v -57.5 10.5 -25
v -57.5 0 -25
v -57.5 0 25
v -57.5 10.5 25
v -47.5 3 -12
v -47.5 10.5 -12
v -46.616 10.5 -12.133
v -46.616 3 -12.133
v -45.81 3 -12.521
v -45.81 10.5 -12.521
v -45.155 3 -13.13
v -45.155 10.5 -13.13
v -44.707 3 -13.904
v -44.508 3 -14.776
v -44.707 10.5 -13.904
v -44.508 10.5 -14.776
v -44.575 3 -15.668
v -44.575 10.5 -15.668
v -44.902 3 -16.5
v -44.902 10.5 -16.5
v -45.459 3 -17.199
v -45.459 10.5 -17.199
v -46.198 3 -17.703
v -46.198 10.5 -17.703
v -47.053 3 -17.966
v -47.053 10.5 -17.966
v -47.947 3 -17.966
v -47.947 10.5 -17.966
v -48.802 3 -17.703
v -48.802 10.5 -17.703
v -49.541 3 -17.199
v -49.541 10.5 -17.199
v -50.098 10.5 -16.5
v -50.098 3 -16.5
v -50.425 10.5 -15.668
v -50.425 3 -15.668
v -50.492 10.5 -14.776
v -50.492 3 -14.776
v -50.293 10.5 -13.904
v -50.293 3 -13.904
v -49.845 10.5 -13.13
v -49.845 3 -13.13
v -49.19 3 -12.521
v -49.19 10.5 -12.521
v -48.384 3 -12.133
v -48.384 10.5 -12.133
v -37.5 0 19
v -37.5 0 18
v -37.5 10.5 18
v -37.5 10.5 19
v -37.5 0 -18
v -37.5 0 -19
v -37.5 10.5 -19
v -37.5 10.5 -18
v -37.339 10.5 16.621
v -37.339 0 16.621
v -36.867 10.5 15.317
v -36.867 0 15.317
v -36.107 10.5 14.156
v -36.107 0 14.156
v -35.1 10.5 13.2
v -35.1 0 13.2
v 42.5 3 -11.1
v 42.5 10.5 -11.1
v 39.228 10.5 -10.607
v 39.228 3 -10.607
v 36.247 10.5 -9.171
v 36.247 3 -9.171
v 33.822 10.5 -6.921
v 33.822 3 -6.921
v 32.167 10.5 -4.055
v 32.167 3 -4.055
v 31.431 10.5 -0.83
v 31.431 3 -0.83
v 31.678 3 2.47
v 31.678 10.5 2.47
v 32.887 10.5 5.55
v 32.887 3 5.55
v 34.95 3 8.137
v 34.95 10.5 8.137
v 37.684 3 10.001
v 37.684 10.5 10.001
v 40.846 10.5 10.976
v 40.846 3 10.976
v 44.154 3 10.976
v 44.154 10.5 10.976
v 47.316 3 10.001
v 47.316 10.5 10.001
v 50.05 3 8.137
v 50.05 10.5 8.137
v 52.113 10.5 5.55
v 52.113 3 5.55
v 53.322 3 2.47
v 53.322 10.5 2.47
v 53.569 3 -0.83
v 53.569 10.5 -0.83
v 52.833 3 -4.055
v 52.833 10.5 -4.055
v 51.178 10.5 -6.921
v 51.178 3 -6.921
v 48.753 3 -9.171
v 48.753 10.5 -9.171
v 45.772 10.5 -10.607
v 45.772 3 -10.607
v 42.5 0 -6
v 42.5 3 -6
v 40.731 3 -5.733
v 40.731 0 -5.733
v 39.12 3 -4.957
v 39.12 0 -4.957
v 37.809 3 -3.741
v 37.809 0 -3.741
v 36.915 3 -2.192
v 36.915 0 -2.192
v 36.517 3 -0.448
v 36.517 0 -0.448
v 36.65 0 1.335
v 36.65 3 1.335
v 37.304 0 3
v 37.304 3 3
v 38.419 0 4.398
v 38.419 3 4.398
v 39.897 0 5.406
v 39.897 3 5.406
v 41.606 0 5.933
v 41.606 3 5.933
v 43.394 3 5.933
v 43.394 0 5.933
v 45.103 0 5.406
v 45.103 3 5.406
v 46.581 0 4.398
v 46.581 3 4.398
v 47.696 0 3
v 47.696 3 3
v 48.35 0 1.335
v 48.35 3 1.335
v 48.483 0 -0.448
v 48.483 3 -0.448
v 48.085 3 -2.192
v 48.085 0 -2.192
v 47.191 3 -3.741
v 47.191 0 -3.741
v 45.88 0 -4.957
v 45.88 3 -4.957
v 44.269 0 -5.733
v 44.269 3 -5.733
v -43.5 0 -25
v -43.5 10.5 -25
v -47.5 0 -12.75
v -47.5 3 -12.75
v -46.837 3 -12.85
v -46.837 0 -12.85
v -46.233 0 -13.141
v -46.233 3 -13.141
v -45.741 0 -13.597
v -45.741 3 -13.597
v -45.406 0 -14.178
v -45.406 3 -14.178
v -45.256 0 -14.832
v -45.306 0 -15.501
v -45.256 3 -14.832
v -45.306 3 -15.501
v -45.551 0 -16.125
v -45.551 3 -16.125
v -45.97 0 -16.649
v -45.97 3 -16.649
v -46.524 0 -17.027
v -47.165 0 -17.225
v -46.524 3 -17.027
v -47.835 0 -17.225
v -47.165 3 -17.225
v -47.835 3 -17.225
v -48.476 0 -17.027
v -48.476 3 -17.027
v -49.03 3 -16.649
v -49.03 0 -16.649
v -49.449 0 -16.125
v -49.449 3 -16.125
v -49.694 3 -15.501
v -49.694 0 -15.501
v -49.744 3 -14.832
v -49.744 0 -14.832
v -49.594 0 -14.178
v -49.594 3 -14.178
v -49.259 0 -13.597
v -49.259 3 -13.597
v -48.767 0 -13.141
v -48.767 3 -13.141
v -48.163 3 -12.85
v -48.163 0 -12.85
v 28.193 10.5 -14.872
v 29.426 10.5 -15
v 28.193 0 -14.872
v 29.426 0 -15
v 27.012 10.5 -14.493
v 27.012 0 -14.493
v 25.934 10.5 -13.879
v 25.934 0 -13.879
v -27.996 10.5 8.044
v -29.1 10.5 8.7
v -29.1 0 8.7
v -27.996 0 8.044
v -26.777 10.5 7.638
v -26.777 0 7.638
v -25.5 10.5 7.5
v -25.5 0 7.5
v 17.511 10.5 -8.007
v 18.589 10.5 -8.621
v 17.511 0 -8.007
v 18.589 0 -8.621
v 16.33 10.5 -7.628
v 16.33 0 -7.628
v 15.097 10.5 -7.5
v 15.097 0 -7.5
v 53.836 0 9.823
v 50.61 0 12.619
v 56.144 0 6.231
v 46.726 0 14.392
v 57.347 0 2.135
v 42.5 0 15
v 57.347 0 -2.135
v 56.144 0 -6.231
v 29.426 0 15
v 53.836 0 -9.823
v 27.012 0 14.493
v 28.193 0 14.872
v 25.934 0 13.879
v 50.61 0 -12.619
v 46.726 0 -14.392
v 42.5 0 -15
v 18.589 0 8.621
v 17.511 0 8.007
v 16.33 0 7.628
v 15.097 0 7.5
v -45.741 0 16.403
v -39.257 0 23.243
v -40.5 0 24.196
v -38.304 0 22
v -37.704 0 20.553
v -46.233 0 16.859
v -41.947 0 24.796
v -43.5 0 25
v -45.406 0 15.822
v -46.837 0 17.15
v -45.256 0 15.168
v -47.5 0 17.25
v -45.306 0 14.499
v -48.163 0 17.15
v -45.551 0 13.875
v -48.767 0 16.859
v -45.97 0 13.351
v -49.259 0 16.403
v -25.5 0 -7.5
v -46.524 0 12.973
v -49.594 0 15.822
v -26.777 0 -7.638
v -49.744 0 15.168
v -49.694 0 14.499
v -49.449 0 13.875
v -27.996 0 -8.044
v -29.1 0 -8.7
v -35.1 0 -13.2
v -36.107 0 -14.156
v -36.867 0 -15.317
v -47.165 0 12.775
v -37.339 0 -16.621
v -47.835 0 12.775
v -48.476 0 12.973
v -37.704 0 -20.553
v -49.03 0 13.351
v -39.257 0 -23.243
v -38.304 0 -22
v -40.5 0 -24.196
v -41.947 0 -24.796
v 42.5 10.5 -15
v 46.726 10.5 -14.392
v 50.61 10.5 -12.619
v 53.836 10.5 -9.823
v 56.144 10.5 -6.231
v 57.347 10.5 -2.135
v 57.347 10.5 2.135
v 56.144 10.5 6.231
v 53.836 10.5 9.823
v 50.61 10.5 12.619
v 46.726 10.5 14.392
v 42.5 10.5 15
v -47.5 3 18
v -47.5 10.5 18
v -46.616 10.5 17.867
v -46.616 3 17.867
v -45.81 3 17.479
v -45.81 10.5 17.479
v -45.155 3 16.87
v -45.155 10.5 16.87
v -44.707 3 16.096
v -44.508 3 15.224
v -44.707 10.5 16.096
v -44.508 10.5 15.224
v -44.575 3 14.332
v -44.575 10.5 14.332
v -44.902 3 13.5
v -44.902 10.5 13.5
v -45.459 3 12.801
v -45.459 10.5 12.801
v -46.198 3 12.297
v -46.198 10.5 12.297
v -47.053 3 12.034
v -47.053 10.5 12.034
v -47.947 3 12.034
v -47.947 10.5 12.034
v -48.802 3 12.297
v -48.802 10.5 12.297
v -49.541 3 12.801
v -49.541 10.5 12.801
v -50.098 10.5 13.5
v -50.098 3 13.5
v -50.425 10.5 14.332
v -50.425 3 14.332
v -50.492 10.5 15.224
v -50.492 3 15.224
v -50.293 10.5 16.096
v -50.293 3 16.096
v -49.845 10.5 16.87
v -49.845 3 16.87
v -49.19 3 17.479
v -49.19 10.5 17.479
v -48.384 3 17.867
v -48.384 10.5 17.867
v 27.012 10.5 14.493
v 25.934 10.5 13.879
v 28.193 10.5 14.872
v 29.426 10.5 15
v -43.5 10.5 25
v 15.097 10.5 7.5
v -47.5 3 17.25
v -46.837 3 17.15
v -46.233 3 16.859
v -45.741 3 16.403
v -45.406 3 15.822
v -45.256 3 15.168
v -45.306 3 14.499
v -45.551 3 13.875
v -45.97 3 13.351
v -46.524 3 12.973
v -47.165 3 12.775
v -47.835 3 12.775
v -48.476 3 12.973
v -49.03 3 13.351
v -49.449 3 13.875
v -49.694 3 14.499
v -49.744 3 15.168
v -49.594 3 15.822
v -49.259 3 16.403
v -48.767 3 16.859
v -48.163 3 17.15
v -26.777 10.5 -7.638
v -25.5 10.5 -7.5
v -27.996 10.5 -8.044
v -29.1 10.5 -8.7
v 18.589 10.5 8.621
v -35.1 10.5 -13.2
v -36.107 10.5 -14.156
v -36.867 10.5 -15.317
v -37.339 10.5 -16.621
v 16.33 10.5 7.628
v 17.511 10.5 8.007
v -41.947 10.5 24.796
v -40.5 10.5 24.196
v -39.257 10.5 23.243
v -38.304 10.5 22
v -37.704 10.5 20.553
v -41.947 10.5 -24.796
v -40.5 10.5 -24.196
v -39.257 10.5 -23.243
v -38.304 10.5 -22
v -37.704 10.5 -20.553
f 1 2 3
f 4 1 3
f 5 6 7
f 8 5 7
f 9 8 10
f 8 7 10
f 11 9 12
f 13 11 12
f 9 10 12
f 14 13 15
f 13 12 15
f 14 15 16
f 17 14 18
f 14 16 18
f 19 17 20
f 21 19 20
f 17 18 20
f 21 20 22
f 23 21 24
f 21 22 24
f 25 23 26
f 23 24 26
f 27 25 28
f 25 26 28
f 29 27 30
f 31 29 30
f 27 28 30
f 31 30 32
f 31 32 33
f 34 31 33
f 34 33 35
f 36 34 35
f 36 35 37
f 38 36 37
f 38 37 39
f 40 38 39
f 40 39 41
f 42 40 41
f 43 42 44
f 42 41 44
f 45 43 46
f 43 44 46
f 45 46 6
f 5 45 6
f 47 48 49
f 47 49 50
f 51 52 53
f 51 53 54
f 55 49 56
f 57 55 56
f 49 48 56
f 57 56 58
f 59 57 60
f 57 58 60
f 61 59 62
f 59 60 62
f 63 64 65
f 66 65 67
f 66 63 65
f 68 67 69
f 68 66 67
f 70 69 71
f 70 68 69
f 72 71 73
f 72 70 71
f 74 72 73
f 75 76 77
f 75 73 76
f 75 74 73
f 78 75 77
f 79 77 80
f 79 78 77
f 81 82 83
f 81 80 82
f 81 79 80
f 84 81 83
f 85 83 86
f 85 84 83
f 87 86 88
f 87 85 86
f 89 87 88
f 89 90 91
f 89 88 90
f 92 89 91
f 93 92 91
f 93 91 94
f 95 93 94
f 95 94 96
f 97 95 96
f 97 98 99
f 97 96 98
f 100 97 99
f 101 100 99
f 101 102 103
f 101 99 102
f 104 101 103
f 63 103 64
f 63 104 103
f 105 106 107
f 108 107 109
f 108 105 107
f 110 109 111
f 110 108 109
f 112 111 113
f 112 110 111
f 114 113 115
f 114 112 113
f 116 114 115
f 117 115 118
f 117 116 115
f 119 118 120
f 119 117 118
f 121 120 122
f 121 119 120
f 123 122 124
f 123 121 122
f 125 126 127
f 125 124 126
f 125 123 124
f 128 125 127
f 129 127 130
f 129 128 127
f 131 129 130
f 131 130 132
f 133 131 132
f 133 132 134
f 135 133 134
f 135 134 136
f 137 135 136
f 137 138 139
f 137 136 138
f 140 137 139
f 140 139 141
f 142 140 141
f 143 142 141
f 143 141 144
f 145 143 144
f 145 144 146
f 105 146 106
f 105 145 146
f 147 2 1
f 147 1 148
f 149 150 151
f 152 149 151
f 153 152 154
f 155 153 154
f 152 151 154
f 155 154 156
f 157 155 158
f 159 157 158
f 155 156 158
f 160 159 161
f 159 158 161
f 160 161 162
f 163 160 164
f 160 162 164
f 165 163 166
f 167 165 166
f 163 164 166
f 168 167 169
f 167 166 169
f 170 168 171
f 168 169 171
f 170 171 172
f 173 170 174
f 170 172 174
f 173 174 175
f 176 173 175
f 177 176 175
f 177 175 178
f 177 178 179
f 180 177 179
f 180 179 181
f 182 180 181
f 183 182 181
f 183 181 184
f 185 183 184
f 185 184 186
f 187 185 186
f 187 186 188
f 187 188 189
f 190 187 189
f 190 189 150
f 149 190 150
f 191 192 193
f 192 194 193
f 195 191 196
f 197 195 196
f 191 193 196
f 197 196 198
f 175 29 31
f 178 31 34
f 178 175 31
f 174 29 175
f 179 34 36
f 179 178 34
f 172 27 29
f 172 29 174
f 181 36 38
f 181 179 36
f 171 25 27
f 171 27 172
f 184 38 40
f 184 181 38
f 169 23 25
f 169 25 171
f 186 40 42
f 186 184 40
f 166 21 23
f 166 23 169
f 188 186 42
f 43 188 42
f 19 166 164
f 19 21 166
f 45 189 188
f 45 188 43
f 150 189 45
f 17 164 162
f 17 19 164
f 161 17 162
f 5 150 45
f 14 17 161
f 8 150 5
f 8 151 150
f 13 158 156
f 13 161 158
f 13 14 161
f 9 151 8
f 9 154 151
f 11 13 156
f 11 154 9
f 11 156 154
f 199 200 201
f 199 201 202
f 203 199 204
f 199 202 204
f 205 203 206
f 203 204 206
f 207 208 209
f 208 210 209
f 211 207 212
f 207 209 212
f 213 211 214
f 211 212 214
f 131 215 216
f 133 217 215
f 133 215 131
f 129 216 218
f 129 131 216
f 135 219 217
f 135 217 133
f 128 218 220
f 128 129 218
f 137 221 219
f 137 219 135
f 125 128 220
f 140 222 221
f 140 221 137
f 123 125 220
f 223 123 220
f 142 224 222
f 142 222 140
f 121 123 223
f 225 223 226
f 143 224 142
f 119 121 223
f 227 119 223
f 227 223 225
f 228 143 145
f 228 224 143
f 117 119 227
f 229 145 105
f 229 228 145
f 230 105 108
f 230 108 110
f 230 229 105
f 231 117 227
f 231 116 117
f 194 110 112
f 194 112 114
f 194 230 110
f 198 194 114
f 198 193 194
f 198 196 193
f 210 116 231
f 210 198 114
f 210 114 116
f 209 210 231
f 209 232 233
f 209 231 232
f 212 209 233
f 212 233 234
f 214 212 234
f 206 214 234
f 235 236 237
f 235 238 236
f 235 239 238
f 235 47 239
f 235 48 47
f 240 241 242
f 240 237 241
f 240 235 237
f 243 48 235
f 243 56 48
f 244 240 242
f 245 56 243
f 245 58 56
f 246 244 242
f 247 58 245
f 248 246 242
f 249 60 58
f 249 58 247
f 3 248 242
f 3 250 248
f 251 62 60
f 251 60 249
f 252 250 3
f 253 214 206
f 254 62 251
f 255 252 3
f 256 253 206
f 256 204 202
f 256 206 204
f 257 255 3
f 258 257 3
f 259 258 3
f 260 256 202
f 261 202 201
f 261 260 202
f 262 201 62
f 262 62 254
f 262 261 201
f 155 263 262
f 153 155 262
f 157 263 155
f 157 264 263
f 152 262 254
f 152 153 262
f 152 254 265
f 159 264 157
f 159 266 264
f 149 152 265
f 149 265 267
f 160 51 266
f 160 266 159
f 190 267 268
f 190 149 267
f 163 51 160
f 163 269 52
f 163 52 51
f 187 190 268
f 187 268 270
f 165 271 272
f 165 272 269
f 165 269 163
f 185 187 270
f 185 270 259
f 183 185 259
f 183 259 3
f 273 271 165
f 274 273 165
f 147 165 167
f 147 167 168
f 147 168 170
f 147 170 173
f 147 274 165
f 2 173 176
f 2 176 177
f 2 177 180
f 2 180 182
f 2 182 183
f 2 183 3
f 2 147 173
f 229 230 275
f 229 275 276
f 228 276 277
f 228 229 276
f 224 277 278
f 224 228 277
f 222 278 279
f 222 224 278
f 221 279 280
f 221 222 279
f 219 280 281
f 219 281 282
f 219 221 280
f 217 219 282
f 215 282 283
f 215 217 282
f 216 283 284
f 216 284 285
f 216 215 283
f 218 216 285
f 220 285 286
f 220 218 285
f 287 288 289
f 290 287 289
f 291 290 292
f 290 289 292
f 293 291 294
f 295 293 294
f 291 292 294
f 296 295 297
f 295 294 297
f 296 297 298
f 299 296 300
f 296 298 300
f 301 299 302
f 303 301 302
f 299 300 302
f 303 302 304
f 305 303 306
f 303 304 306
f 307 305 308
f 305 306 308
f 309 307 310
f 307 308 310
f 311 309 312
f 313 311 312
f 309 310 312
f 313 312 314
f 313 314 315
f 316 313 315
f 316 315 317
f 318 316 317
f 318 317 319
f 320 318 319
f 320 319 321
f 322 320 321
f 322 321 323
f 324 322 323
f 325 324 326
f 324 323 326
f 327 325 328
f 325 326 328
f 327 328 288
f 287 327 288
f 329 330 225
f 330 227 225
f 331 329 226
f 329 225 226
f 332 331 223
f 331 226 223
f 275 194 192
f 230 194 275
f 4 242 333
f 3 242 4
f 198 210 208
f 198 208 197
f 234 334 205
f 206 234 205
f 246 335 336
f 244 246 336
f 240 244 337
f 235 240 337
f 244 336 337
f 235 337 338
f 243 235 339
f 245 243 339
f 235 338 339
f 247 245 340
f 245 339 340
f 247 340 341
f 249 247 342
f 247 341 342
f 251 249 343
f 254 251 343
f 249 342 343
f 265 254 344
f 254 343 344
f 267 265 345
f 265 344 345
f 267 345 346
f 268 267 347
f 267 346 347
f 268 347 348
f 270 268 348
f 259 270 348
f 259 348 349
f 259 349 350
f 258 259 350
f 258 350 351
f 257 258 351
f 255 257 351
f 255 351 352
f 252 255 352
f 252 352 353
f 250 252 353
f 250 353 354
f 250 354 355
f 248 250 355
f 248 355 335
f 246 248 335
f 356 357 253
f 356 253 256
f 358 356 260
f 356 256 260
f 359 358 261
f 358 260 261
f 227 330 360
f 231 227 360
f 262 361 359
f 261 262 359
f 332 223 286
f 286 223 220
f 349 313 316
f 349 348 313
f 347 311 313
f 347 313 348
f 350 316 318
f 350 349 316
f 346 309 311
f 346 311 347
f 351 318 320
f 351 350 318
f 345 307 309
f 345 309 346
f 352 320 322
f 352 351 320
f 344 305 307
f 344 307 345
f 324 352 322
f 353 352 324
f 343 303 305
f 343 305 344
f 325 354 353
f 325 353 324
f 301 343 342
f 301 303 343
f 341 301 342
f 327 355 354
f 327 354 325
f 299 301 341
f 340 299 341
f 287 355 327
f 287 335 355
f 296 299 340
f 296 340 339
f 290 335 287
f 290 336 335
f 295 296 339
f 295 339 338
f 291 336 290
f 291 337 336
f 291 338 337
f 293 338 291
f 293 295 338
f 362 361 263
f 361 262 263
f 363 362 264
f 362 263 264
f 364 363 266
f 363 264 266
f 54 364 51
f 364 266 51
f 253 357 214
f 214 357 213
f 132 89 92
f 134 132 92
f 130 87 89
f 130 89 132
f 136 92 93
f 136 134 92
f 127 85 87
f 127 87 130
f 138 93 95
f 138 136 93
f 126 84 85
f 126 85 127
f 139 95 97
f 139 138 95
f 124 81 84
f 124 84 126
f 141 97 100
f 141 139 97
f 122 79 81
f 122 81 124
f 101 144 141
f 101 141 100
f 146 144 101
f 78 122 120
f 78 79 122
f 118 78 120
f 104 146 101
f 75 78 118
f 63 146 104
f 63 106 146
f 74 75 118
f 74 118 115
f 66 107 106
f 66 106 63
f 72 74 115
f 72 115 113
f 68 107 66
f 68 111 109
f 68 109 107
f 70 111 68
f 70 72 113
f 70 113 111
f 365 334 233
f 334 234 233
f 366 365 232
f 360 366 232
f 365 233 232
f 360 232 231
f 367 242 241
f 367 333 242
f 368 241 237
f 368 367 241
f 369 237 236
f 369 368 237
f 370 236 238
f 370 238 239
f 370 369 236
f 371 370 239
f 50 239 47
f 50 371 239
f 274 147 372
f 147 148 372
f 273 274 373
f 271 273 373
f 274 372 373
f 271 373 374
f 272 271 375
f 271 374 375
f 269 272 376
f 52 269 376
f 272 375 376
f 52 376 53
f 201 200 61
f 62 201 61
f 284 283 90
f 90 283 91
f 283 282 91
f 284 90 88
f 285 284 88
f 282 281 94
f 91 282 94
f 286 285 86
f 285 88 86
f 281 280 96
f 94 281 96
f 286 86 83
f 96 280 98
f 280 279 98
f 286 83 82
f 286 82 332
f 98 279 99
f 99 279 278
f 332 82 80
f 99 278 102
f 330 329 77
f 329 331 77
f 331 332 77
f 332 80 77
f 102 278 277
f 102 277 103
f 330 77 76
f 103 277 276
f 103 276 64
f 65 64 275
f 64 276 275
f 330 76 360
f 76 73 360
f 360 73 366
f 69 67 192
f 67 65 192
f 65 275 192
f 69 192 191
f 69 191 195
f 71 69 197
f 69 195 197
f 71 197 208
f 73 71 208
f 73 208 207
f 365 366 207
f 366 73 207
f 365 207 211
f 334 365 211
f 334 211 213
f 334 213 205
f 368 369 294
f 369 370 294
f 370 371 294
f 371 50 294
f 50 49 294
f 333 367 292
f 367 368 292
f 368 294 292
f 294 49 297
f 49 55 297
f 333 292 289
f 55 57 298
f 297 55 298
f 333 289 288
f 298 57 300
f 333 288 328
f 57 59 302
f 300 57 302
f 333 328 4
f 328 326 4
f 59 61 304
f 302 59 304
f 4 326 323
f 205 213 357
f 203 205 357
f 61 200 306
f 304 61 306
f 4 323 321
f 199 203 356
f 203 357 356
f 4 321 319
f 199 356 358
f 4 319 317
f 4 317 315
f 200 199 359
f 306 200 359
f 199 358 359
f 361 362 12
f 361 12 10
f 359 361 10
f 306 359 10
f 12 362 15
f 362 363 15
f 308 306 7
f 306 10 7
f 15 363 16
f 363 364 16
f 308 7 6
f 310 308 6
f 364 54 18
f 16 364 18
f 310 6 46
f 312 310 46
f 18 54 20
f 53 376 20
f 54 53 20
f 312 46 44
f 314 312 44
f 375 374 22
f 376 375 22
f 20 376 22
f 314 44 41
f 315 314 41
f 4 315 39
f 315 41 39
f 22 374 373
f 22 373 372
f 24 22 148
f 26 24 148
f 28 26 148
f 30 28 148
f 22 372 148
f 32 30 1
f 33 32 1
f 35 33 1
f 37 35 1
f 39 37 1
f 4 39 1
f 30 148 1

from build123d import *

# Parameters (mm, degrees)
SKETCH1_W           = 115
SKETCH1_H           = 30
BOSS_EXTRUDE1_DEPTH = 10.5
CUT_EXTRUDE1_START  = 3
SKETCH2_R           = 11.1
CUT_EXTRUDE1_DEPTH  = 10.5
SKETCH3_R           = 6
CUT_EXTRUDE4_DEPTH  = 10.5
BOSS_EXTRUDE2_DEPTH = 10.5
SKETCH6_R           = 2.25
CUT_EXTRUDE5_DEPTH  = 10.5
SKETCH7_R           = 3
CUT_EXTRUDE6_DEPTH  = 7.5
CUT_EXTRUDE7_DEPTH  = 28.5
FILLET1_R           = 6
FILLET2_RADIUS      = 15
FILLET2_LENGTH      = 10.5


with BuildPart() as part:
    # Sketch1 → Boss-Extrude1 (new body)
    with BuildSketch(Plane(origin=(0, 0, 0), x_dir=(1, 0, 0), z_dir=(0, 1, 0))):
        Rectangle(SKETCH1_W, SKETCH1_H)
    extrude(amount=BOSS_EXTRUDE1_DEPTH)

    # Sketch2 → Cut-Extrude1 (cut)
    with BuildSketch(Plane(origin=(0, 0, 0), x_dir=(1, 0, 0), z_dir=(0, 1, 0)).offset(CUT_EXTRUDE1_START)):
        with Locations(Location((42.5, 0, 0), (0, 0, 90))):
            Circle(SKETCH2_R)
    extrude(amount=CUT_EXTRUDE1_DEPTH, mode=Mode.SUBTRACT)

    # Sketch3 → Cut-Extrude4 (cut)
    with BuildSketch(Plane(origin=(0, 0, 0), x_dir=(1, 0, 0), z_dir=(0, 1, 0))):
        with Locations(Location((42.5, 0, 0), (0, 0, 90))):
            Circle(SKETCH3_R)
    extrude(amount=CUT_EXTRUDE4_DEPTH, mode=Mode.SUBTRACT)

    # Sketch5 → Boss-Extrude2 (add)
    with BuildSketch(Plane(origin=(0, 0, 0), x_dir=(1, 0, 0), z_dir=(0, 1, 0))):
        Polygon((-57.5, 15), (-57.5, 25), (-37.5, 25), (-37.5, -25), (-57.5, -25), (-57.5, -15), align=None)
    extrude(amount=BOSS_EXTRUDE2_DEPTH)

    # Sketch6 → Cut-Extrude5 (cut)
    with BuildSketch(Plane(origin=(0, 10.5, 0), x_dir=(1, 0, 0), z_dir=(0, 1, 0))):
        with Locations(Location((-47.5, -15, 0), (0, 0, 270))):
            Circle(SKETCH6_R)
        with Locations(Location((-47.5, 15, 0), (0, 0, 270))):
            Circle(SKETCH6_R)
    extrude(amount=-CUT_EXTRUDE5_DEPTH, mode=Mode.SUBTRACT)

    # Sketch7 → Cut-Extrude6 (cut)
    with BuildSketch(Plane(origin=(0, 10.5, 0), x_dir=(1, 0, 0), z_dir=(0, 1, 0))):
        with Locations(Location((-47.5, 15, 0), (0, 0, 270))):
            Circle(SKETCH7_R)
        with Locations(Location((-47.5, -15, 0), (0, 0, 270))):
            Circle(SKETCH7_R)
    extrude(amount=-CUT_EXTRUDE6_DEPTH, mode=Mode.SUBTRACT)

    # Sketch8 → Cut-Extrude7 (cut)
    with BuildSketch(Plane(origin=(0, 10.5, 0), x_dir=(1, 0, 0), z_dir=(0, 1, 0))):
        Polygon((-37.5, 15), (-27.5, 7.5), (17.022877386, 7.5), (27.5, 15), align=None)
        Polygon((-37.5, -15), (27.5, -15), (17.022877386, -7.5), (-27.5, -7.5), align=None)
    extrude(amount=-CUT_EXTRUDE7_DEPTH, mode=Mode.SUBTRACT)

    # Fillet1
    fillet1_edges = [part.edges().sort_by_distance(p)[0] for p in [
        (-37.5, 5.25, -15),
        (-37.5, 5.25, 15),
        (-37.5, 5.25, 25),
        (-37.5, 5.25, -25),
        (27.5, 5.25, -15),
        (17.022877386, 5.25, -7.5),
        (-27.5, 5.25, -7.5),
        (-27.5, 5.25, 7.5),
        (17.022877386, 5.25, 7.5),
        (27.5, 5.25, 15),
    ]]
    fillet(fillet1_edges, radius=FILLET1_R)

    # Fillet2: full round fillet: the end face becomes a half cylinder, R = half its width
    fillet2_face = Plane((57.5, 5.25, 0), x_dir=(0, -1, 0), z_dir=(1, 0, 0))  # on the end face: x along it, z out of the body
    fillet2_slab = fillet2_face.offset(-FILLET2_RADIUS / 2) * Box(FILLET2_LENGTH, 2 * FILLET2_RADIUS, FILLET2_RADIUS, mode=Mode.PRIVATE)  # the body's end, R deep
    fillet2_round = Plane((42.5, 5.25, 0), x_dir=(1, 0, 0), z_dir=(0, -1, 0)) * Cylinder(FILLET2_RADIUS, FILLET2_LENGTH, mode=Mode.PRIVATE)  # its axis R under the face
    add(fillet2_slab - fillet2_round, mode=Mode.SUBTRACT)


solid = part.part
